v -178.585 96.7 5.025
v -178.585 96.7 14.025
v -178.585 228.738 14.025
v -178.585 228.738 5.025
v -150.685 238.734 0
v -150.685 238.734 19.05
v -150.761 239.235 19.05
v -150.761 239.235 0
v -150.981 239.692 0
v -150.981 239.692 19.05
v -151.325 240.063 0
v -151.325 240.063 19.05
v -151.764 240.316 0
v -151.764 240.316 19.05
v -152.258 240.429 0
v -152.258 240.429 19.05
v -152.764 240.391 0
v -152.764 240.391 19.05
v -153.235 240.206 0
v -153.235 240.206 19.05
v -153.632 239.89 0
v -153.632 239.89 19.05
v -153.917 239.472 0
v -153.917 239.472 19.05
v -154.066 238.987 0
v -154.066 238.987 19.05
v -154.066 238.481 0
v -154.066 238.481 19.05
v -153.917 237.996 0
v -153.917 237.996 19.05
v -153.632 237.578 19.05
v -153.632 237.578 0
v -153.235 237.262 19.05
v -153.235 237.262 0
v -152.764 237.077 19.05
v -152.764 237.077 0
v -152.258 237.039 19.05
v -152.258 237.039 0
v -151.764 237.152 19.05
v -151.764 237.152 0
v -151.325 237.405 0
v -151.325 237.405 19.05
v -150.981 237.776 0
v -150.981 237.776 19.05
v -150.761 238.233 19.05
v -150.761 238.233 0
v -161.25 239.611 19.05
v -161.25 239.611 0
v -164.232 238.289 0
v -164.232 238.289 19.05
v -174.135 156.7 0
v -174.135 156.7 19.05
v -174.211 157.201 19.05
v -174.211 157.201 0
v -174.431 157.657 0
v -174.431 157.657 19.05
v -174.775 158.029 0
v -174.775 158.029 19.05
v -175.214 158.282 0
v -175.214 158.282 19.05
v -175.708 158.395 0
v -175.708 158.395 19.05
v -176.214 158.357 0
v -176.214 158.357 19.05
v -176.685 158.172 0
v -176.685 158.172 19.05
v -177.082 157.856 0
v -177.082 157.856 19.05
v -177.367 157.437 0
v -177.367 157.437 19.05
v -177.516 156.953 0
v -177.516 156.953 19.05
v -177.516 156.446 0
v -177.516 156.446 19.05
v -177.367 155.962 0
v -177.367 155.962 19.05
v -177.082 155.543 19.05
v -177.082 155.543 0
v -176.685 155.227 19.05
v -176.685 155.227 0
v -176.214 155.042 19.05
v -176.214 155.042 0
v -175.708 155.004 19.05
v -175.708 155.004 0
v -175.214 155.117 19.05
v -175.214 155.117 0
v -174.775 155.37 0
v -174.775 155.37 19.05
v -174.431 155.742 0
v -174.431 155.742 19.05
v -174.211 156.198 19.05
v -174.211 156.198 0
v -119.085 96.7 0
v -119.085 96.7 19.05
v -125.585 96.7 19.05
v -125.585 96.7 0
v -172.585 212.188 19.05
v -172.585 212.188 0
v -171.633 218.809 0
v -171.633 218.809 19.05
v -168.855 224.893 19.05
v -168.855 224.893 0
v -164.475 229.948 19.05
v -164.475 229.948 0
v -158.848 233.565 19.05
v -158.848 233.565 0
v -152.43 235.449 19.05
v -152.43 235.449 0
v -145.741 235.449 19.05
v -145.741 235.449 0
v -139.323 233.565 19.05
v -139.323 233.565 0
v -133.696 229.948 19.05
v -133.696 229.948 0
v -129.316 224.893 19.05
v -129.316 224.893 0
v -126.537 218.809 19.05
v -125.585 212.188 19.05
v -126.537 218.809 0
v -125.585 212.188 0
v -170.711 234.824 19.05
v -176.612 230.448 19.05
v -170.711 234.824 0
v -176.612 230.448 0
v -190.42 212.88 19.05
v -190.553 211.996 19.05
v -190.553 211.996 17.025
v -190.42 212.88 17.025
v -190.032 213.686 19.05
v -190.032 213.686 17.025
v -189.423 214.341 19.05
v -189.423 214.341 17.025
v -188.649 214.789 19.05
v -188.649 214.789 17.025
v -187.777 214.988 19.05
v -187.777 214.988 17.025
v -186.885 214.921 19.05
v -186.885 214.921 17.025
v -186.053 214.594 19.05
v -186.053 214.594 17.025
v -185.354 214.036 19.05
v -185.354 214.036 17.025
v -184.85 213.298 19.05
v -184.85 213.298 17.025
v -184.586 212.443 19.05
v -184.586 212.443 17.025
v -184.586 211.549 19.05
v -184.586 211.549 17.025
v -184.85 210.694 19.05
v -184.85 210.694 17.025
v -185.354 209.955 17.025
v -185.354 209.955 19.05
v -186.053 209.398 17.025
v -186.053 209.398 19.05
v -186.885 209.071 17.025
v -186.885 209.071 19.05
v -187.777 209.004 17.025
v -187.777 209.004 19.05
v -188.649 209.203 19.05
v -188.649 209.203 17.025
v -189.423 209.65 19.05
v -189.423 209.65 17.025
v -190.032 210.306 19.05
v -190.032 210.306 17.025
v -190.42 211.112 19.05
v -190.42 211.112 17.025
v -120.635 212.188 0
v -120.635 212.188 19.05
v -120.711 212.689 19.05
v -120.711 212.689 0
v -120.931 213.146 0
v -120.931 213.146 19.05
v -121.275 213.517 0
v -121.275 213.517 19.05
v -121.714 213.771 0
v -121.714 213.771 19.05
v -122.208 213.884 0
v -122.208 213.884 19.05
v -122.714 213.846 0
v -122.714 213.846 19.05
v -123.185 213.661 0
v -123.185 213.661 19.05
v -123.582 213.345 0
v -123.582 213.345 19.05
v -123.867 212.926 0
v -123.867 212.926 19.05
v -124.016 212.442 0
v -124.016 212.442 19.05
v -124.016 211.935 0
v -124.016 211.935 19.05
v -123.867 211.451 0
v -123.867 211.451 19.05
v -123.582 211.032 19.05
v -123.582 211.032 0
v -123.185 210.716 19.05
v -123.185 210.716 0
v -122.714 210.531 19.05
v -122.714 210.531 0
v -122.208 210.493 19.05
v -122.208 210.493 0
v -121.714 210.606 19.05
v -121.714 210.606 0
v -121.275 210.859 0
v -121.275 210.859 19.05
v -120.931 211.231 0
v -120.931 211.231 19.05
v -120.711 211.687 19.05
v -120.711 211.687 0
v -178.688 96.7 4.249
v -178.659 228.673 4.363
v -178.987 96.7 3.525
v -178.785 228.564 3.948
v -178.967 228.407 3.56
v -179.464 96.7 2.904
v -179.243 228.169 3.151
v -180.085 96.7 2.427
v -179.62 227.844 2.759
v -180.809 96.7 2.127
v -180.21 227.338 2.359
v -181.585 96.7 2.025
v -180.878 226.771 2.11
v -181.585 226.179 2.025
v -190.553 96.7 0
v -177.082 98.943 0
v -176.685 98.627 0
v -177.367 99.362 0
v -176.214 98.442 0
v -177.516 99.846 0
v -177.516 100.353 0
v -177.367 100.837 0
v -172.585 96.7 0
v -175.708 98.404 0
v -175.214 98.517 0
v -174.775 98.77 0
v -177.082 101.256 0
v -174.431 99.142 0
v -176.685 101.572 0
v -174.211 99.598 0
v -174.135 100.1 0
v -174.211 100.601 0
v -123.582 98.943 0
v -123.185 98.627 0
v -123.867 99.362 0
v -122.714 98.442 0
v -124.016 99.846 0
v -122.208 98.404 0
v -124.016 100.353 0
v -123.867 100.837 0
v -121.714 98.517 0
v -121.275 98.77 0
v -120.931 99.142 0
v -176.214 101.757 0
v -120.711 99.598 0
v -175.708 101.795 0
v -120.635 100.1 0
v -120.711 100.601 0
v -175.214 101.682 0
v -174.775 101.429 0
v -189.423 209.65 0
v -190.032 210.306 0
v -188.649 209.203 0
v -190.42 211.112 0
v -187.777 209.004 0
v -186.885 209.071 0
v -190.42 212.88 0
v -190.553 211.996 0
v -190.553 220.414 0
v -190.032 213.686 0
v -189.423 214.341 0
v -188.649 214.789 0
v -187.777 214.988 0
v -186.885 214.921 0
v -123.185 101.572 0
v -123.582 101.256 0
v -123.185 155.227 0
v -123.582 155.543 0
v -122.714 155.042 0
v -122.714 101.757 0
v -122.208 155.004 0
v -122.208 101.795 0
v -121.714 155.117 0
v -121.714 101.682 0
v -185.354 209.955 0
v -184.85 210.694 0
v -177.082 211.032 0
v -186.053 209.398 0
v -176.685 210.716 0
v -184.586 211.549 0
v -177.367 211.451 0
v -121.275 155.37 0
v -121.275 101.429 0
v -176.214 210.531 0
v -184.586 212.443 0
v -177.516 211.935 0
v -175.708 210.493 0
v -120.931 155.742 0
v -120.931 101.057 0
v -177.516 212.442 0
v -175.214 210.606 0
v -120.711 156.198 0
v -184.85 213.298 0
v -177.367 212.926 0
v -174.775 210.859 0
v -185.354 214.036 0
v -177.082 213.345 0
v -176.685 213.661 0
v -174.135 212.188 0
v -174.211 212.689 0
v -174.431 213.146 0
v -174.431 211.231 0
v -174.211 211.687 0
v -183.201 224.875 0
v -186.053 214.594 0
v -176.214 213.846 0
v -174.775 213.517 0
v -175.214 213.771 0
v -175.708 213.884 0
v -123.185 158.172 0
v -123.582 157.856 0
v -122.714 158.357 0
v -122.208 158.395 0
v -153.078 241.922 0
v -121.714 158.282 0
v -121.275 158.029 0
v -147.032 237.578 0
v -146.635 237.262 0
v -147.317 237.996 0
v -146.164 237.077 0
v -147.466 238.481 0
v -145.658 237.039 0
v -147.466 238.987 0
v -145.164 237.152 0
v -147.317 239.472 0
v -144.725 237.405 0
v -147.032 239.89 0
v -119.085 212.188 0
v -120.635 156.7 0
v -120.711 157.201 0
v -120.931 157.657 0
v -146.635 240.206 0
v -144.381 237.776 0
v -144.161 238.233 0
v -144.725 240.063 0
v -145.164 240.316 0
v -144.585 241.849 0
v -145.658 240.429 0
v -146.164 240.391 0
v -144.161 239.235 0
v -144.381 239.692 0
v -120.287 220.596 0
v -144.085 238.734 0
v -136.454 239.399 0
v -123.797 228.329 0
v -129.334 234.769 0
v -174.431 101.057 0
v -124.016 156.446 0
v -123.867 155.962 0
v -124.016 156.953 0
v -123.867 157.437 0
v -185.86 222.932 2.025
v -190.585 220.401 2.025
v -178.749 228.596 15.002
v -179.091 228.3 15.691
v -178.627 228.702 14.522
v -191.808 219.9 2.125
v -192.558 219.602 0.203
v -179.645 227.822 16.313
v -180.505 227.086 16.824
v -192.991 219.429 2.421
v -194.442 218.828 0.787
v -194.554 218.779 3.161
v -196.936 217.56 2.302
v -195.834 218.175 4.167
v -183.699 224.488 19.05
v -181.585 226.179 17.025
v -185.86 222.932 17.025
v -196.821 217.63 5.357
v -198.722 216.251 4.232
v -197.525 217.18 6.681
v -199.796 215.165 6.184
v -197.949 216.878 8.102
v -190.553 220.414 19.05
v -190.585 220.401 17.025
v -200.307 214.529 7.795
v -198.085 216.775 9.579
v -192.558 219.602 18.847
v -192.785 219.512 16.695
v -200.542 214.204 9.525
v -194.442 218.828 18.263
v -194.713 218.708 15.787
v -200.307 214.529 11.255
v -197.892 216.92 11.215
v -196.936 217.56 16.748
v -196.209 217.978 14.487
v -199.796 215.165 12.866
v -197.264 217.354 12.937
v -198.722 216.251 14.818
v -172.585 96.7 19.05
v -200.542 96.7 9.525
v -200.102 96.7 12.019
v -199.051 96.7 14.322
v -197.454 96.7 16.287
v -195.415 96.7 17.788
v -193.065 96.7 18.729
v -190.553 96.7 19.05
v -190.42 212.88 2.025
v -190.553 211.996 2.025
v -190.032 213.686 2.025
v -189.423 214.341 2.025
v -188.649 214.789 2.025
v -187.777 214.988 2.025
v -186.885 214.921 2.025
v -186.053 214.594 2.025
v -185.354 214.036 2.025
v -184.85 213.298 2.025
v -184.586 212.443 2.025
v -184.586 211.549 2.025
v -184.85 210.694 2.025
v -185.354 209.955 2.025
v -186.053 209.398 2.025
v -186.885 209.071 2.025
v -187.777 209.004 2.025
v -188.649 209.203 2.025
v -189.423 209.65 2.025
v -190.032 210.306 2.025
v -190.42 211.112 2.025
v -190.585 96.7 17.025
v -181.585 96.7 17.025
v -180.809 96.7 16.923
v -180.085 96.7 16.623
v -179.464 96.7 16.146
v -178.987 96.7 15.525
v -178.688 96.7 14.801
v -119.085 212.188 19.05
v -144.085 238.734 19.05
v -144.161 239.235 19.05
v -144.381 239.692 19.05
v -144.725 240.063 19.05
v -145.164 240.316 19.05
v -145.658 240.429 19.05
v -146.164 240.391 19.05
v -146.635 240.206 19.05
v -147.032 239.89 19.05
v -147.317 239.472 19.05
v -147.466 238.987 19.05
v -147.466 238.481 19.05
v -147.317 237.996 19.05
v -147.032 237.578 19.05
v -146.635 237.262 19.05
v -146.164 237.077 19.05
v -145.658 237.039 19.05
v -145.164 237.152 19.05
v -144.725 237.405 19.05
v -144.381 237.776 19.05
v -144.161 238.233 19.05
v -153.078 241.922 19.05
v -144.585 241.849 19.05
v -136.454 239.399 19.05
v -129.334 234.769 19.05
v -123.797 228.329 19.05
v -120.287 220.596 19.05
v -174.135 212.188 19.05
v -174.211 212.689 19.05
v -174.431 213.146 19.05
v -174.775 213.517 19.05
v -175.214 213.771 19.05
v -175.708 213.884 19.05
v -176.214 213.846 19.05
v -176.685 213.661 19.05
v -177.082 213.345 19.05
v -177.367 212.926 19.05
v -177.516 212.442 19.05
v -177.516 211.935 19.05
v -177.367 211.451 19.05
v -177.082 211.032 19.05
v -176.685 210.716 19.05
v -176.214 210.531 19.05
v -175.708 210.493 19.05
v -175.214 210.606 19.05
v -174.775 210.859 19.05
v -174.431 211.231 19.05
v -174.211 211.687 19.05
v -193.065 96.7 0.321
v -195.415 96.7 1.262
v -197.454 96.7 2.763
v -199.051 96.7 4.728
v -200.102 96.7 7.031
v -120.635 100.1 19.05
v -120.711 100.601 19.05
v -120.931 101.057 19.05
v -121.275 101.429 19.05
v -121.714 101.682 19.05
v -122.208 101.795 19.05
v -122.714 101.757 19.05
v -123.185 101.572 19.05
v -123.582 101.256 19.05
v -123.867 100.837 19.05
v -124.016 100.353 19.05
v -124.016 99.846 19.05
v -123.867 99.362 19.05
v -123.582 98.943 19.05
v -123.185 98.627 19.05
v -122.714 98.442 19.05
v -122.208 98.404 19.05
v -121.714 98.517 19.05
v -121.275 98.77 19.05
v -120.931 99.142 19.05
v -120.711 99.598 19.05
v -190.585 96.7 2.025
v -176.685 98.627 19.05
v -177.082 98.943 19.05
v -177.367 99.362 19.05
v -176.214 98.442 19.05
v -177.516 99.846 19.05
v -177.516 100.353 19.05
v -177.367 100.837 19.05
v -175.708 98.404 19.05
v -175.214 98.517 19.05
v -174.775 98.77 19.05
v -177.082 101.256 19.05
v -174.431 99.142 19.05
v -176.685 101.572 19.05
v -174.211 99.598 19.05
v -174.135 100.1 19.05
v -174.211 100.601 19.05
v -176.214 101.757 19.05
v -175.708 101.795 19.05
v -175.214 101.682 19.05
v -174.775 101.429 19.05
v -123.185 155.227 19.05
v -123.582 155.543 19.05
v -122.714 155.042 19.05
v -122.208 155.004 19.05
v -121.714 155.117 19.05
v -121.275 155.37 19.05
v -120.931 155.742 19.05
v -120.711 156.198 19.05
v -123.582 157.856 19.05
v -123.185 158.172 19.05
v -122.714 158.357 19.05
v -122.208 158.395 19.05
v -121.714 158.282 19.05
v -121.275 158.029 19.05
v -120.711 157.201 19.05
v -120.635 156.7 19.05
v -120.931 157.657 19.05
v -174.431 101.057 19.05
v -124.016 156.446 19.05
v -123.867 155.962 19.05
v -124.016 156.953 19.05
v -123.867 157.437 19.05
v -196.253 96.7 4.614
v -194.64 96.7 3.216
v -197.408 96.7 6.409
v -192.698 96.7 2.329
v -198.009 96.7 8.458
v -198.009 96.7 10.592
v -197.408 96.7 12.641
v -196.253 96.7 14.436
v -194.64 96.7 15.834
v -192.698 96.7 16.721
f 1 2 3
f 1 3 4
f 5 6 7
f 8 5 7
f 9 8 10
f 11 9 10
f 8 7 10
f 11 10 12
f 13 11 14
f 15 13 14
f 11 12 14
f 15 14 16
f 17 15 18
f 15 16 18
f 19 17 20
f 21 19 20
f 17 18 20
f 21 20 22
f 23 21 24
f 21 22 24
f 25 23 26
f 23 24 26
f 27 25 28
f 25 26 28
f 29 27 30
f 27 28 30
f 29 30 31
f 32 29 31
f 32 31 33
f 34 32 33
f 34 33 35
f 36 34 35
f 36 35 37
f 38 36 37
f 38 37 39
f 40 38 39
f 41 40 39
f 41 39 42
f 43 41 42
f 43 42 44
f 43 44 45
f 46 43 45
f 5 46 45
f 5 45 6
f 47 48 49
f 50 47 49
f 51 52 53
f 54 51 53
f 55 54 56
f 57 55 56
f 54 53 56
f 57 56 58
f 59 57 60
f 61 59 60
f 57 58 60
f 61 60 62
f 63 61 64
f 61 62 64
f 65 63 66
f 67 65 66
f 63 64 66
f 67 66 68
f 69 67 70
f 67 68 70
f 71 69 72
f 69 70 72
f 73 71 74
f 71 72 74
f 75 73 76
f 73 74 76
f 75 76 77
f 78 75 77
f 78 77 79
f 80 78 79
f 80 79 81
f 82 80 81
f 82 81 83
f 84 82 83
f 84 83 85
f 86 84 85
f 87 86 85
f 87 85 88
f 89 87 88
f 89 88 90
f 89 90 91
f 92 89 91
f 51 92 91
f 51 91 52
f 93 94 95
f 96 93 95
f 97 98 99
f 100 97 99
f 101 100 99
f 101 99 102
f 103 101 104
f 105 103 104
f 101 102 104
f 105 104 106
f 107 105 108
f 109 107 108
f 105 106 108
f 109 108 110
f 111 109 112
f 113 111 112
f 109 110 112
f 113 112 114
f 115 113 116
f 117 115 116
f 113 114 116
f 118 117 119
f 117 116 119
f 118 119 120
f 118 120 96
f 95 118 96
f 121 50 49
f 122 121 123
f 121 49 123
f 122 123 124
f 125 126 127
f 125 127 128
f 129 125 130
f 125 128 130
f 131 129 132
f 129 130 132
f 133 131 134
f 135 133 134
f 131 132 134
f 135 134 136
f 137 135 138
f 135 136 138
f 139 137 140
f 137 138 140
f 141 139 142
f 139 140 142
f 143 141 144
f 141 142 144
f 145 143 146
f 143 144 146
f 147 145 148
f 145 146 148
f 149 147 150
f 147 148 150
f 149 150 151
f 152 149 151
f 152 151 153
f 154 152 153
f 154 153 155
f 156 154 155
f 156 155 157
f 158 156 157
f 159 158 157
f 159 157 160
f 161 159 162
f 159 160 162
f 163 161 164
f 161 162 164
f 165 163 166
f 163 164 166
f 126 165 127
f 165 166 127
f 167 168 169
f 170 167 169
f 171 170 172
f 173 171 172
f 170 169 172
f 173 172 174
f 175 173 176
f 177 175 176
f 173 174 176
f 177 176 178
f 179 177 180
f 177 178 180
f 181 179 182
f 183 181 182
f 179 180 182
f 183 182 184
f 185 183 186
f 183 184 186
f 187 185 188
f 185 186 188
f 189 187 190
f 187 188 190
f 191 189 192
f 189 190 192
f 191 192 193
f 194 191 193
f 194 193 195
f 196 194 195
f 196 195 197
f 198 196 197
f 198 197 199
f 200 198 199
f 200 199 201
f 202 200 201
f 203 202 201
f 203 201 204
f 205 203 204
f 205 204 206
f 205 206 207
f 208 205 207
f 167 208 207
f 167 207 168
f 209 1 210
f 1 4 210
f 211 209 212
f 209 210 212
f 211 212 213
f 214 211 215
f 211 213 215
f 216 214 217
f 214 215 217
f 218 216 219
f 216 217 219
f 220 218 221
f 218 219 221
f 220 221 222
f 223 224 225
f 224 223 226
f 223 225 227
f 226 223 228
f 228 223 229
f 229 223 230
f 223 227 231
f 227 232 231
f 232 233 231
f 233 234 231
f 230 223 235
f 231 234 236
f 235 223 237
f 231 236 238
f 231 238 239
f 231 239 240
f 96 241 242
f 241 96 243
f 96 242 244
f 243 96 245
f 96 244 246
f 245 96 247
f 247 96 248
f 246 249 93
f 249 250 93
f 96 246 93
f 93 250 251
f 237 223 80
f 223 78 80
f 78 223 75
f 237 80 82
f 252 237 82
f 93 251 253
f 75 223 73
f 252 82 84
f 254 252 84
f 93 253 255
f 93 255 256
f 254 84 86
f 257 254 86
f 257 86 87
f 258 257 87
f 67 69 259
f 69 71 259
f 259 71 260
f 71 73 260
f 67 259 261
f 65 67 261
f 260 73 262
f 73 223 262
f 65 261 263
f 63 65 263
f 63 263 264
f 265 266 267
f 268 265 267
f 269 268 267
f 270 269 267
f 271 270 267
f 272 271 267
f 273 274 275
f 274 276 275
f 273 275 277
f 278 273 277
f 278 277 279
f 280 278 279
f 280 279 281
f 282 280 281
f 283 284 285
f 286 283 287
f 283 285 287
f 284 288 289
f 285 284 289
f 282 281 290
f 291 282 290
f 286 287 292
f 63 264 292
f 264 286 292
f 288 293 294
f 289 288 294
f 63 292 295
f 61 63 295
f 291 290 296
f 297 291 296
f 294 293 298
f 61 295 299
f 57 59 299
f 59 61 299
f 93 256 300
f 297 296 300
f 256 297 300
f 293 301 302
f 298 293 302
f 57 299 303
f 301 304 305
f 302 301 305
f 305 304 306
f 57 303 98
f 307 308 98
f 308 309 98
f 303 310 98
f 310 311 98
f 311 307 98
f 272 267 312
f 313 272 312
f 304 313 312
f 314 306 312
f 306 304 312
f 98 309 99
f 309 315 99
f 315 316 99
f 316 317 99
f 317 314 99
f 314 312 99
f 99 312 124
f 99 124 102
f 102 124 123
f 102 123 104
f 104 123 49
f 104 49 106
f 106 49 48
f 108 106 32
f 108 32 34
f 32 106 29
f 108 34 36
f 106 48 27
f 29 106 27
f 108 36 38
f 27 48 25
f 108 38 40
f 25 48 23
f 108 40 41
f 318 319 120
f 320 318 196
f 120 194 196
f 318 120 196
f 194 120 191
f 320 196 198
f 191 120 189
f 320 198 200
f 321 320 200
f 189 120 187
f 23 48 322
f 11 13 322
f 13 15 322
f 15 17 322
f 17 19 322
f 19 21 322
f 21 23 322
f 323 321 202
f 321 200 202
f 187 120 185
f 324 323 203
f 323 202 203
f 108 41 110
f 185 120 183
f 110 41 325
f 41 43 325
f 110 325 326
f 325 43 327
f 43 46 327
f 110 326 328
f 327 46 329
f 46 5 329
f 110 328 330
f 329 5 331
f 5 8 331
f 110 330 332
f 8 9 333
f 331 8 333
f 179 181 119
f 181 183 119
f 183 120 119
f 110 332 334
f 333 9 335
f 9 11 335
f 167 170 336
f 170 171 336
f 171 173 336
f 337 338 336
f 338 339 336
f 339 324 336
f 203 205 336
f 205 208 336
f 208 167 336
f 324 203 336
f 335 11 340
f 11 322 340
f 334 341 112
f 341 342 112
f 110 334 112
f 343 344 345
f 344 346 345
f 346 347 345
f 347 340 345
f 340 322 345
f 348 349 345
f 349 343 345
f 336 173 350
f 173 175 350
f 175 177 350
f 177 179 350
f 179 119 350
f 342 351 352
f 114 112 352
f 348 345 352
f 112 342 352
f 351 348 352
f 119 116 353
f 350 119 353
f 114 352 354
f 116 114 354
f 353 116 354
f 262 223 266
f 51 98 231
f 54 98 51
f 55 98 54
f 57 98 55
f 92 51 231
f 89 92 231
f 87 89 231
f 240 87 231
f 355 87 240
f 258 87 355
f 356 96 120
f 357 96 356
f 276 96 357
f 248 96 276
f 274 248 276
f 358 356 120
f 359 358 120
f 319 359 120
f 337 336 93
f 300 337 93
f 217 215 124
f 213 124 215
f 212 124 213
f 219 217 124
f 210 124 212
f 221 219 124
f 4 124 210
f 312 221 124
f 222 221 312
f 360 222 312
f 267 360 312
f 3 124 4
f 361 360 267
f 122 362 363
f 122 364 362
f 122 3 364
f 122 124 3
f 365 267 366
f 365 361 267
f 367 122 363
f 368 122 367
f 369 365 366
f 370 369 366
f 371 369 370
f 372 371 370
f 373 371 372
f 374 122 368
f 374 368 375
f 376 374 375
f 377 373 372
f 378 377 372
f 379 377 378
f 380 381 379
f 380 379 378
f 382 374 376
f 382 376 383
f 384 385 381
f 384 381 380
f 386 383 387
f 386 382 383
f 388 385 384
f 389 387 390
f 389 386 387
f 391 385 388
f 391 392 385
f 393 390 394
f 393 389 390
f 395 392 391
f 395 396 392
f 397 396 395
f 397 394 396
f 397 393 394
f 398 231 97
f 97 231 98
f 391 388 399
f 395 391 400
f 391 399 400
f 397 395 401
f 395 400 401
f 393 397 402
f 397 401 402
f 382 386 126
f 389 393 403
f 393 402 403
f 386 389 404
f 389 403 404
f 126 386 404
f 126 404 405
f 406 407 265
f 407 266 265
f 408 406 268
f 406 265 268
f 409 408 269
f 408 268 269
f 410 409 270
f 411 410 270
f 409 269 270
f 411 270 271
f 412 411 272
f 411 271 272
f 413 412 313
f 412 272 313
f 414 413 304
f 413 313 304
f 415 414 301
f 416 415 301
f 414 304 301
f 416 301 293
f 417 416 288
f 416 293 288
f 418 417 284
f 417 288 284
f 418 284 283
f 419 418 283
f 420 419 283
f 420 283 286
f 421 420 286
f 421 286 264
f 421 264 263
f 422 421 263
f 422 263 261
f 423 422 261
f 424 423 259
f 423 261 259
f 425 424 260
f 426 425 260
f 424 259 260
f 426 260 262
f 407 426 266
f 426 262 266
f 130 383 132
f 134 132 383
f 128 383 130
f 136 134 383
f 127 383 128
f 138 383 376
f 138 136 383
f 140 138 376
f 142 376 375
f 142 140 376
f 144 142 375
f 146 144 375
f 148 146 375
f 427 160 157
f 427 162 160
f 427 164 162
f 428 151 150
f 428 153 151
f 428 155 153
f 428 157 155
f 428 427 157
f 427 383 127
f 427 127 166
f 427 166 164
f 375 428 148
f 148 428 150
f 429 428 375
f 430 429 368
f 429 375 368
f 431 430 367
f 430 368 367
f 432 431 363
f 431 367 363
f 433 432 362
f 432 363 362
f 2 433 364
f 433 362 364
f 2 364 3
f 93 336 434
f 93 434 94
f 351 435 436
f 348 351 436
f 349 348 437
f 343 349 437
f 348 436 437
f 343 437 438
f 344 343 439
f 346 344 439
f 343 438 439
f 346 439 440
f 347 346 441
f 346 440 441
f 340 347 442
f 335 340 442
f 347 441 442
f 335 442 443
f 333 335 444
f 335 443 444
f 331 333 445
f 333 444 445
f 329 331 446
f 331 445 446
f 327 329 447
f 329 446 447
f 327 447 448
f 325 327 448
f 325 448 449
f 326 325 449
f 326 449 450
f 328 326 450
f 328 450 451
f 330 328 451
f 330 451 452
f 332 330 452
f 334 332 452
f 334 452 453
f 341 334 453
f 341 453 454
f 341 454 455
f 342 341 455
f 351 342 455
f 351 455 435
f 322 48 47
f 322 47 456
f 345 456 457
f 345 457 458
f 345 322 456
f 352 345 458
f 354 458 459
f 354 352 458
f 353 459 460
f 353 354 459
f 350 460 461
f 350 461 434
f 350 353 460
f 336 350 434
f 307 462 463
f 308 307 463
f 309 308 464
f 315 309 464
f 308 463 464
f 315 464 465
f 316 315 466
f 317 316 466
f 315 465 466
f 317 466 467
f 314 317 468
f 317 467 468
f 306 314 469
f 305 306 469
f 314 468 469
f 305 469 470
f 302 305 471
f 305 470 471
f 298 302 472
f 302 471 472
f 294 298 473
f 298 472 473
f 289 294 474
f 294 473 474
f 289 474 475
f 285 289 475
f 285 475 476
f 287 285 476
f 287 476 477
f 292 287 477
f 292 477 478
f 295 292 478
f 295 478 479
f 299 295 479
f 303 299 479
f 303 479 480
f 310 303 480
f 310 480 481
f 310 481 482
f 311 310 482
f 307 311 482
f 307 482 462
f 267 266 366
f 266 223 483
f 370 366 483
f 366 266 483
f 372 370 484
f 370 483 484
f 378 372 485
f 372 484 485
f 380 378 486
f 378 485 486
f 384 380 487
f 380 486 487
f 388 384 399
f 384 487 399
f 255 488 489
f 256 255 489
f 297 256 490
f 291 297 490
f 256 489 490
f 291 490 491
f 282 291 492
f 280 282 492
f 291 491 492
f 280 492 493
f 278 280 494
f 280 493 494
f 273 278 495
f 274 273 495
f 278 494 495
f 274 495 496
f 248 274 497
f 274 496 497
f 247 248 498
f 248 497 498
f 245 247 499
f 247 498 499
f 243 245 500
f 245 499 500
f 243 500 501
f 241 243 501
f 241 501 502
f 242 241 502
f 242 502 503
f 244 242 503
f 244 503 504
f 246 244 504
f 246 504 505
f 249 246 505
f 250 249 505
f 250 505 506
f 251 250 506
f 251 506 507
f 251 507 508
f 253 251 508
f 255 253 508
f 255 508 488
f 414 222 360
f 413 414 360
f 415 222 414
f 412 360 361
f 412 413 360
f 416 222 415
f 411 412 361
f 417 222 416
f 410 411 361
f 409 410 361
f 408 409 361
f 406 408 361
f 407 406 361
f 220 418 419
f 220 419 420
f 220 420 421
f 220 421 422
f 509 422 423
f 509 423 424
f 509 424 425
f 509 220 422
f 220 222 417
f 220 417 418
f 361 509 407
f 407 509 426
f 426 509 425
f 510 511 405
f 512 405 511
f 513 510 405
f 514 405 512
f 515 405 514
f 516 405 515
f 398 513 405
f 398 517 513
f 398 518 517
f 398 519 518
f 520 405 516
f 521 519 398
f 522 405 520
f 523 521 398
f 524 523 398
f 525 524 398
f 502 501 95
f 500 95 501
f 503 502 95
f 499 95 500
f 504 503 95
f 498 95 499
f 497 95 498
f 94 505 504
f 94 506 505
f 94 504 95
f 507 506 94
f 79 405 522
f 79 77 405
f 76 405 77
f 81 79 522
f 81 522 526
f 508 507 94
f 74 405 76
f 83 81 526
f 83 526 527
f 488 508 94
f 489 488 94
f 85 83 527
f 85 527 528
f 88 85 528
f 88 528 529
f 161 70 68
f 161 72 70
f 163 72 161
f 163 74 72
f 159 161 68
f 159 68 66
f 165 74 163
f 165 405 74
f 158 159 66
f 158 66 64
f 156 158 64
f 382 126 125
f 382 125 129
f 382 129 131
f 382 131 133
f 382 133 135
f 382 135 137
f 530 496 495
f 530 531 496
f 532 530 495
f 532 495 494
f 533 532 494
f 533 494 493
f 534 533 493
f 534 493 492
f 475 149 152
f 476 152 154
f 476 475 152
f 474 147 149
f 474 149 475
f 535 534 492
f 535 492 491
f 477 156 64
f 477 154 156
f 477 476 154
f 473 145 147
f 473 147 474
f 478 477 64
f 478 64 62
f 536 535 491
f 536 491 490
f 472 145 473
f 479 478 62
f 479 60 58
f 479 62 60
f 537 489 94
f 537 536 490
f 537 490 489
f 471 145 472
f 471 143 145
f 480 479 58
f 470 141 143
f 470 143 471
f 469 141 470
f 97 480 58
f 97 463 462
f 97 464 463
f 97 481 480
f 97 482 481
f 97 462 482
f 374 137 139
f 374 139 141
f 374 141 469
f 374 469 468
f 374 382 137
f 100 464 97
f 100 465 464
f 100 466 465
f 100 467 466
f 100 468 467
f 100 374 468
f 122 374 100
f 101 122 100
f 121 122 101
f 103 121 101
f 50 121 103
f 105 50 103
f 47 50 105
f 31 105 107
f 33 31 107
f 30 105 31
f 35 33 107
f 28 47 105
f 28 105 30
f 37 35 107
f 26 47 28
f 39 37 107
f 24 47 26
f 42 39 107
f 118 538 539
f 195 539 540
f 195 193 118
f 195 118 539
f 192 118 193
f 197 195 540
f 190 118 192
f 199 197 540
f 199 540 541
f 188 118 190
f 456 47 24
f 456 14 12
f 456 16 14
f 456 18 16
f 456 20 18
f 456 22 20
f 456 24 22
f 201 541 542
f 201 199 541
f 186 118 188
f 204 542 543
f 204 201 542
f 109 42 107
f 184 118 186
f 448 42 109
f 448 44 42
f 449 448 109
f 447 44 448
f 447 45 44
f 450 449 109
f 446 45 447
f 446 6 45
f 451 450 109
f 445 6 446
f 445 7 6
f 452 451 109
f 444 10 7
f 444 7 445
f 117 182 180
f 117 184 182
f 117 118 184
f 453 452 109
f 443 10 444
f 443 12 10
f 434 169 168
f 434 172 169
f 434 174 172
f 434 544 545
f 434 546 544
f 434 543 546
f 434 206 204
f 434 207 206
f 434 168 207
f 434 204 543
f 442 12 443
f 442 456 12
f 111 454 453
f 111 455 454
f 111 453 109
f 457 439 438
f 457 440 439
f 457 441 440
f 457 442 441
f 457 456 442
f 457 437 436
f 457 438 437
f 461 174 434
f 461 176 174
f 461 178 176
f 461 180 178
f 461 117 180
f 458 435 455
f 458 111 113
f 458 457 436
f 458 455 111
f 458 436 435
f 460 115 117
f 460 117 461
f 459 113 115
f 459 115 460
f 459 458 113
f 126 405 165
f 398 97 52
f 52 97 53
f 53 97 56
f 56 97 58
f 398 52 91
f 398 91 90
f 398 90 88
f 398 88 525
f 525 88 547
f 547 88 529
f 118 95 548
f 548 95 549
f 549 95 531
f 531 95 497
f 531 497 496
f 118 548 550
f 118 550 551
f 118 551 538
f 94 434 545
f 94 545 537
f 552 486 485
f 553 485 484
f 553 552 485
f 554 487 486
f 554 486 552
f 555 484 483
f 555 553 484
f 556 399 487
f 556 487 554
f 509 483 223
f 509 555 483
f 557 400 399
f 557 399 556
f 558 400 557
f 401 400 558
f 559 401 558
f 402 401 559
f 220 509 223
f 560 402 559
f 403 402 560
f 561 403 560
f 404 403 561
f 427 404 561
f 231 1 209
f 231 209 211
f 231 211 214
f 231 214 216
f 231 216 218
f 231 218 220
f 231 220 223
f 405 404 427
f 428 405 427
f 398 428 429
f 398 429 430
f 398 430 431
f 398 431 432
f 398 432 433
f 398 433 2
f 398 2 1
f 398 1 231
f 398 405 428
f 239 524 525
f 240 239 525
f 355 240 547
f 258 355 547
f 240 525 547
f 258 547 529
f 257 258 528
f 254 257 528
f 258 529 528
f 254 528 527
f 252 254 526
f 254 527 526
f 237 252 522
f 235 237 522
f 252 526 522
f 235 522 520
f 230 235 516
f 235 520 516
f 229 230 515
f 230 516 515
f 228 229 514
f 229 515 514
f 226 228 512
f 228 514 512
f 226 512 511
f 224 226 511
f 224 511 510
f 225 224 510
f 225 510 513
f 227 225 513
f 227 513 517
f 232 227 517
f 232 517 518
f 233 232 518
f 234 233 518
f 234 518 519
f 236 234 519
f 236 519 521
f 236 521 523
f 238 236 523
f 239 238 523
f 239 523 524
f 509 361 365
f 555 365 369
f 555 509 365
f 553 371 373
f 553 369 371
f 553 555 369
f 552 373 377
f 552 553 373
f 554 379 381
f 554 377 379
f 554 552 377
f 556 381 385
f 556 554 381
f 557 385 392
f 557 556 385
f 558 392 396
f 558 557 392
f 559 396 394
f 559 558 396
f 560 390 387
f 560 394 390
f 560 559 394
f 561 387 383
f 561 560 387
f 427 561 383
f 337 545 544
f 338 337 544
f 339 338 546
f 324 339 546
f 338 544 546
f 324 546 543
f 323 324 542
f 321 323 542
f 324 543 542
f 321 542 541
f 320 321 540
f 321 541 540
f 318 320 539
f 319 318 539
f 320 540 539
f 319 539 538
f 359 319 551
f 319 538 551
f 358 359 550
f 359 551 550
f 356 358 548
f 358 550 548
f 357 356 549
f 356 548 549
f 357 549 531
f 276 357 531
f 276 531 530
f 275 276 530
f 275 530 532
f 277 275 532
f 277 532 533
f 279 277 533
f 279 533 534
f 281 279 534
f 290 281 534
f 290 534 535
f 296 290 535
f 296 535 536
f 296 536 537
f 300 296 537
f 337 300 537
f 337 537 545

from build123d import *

# Parameters (mm, degrees)
BOSS_EXTRUDE1_DEPTH = 19.05
SKETCH2_R           = 1.7
CUT_EXTRUDE1_DEPTH  = 302.810637772
CUT_EXTRUDE2_DEPTH  = 302.810637772
BOSS_EXTRUDE2_DEPTH = 135
BOSS_EXTRUDE3_START = -19.05
BOSS_EXTRUDE3_DEPTH = 19.05
CUT_EXTRUDE4_DEPTH  = 316.043777756
CUT_EXTRUDE5_DEPTH  = 249.524391307
FILLET2_R           = 50
FILLET3_R           = 10
FILLET4_R           = 3
SKETCH8_R           = 3
CUT_EXTRUDE6_DEPTH  = 316.015975709


with BuildPart() as part:
    # Sketch1 → Boss-Extrude1 (new body)
    with BuildSketch(Plane.XY):
        with BuildLine():
            Line((-179.085368151, -18.789194183), (-179.085368151, 212.188334746))
            ThreePointArc((-179.085368151, 212.188334746), (-149.085368151, 242.188334746), (-119.085368151, 212.188334746))
            Line((-119.085368151, 212.188334746), (-119.085368151, -18.789194183))
            ThreePointArc((-119.085368151, -18.789194183), (-149.085368151, -48.789194183), (-179.085368151, -18.789194183))
        make_face()
        with BuildLine():
            Line((-172.585368151, -18.789194183), (-172.585368151, 212.188334746))
            ThreePointArc((-172.585368151, 212.188334746), (-149.085368151, 235.688334746), (-125.585368151, 212.188334746))
            Line((-125.585368151, 212.188334746), (-125.585368151, -18.789194183))
            ThreePointArc((-125.585368151, -18.789194183), (-149.085368151, -42.289194183), (-172.585368151, -18.789194183))
        make_face(mode=Mode.SUBTRACT)
    extrude(amount=BOSS_EXTRUDE1_DEPTH)

    # Sketch2 → Cut-Extrude1 (cut, through all)
    with BuildSketch(Plane.XY.offset(19.05)):
        with Locations((-145.785368151, 238.734002942)):
            Circle(SKETCH2_R)
        with Locations((-122.335368151, 212.188334746)):
            Circle(SKETCH2_R)
        with Locations((-152.485368151, -45.322239617)):
            Circle(SKETCH2_R)
        with Locations((-168.000474547, -37.70430058)):
            Circle(SKETCH2_R)
        with Locations((-175.835368151, -18.789194183)):
            Circle(SKETCH2_R)
        with Locations((-175.835368151, 212.188334746)):
            Circle(SKETCH2_R)
        with Locations((-145.685368151, -45.322239617)):
            Circle(SKETCH2_R)
        with Locations((-175.835368151, 100.099570281)):
            Circle(SKETCH2_R)
        with Locations((-175.835368151, 93.299570281)):
            Circle(SKETCH2_R)
        with Locations((-122.335368151, 100.099570281)):
            Circle(SKETCH2_R)
        with Locations((-122.335368151, 93.299570281)):
            Circle(SKETCH2_R)
        with Locations((-122.335368151, -18.789194183)):
            Circle(SKETCH2_R)
        with Locations((-130.170261754, -37.70430058)):
            Circle(SKETCH2_R)
        with Locations((-175.835368151, 156.699570281)):
            Circle(SKETCH2_R)
        with Locations((-122.335368151, 156.699570281)):
            Circle(SKETCH2_R)
        with Locations((-175.835368151, 66.699570281)):
            Circle(SKETCH2_R)
        with Locations((-122.335368151, 66.699570281)):
            Circle(SKETCH2_R)
        with Locations((-175.835368151, 36.699570281)):
            Circle(SKETCH2_R)
        with Locations((-122.335368151, 36.699570281)):
            Circle(SKETCH2_R)
        with Locations((-175.835368151, 6.699570281)):
            Circle(SKETCH2_R)
        with Locations((-122.335368151, 6.699570281)):
            Circle(SKETCH2_R)
        with Locations((-152.385368151, 238.734002942)):
            Circle(SKETCH2_R)
    extrude(amount=-CUT_EXTRUDE1_DEPTH, mode=Mode.SUBTRACT)

    # Sketch3 → Cut-Extrude2 (cut, through all)
    with BuildSketch(Plane.XY.offset(19.05)):
        Polygon((-149.085368151, 96.699570281), (-100.167336626, 96.699570281), (-100.167336626, -59.171887956), (-212.527814826, -59.171887956), (-212.527814826, 96.699570281), align=None)
    extrude(amount=-CUT_EXTRUDE2_DEPTH, mode=Mode.SUBTRACT)

    # Sketch4 → Boss-Extrude2 (add)
    with BuildSketch(Plane.XZ.offset(-96.699570281)):
        with BuildLine():
            Line((-179.085368151, 19.05), (-196.652205402, 19.05))
            ThreePointArc((-196.652205402, 19.05), (-200.585368151, 9.525), (-196.652205402, 0))
            Line((-196.652205402, 0), (-179.085368151, 0))
            Line((-179.085368151, 0), (-179.085368151, 19.05))
        make_face()
    extrude(amount=-BOSS_EXTRUDE2_DEPTH)

    # Sketch5 → Boss-Extrude3 (add)
    with BuildSketch(Plane.XY.offset(19.05).offset(BOSS_EXTRUDE3_START)):
        with BuildLine():
            Line((-179.085368151, 231.699570281), (-179.085368151, 212.188334746))
            ThreePointArc((-179.085368151, 212.188334746), (-174.234371945, 228.544605963), (-161.250194275, 239.611263206))
            Line((-161.250194275, 239.611263206), (-179.085368151, 231.699570281))
        make_face()
    extrude(amount=BOSS_EXTRUDE3_DEPTH)

    # Sketch6 → Cut-Extrude4 (cut, through all)
    with BuildSketch(Plane.XY.offset(19.05)):
        with BuildLine():
            Line((-170.167781213, 235.655416744), (-200.585368151, 235.655416744))
            Line((-200.585368151, 235.655416744), (-200.585368151, 214.140637656))
            add(Edge.make_bspline(
                [(-170.167781213, 235.655416744), (-176.900282948, 230.746544465), (-186.999558372, 219.576390382), (-197.475317375, 218.661877457), (-200.585368151, 214.140637656)],
                knots=[0, 0, 0, 0, 0.548460348, 1, 1, 1, 1], degree=3))
        make_face()
    extrude(amount=-CUT_EXTRUDE4_DEPTH, mode=Mode.SUBTRACT)

    # Sketch7 → Cut-Extrude5 (cut, through all)
    with BuildSketch(Plane.XZ.offset(-96.699570281)):
        with BuildLine():
            Line((-190.585368151, 17.025), (-178.585368151, 17.025))
            Line((-178.585368151, 17.025), (-178.585368151, 2.025))
            Line((-178.585368151, 2.025), (-190.585368151, 2.025))
            ThreePointArc((-190.585368151, 2.025), (-198.085368151, 9.525), (-190.585368151, 17.025))
        make_face()
    extrude(amount=-CUT_EXTRUDE5_DEPTH, mode=Mode.SUBTRACT)

    # Fillet2
    fillet2_edges = [part.edges().sort_by_distance(p)[0] for p in [
        (-170.167781213, 235.655416744, 9.525),
    ]]
    fillet(fillet2_edges, radius=FILLET2_R)

    # Fillet3
    # the kernel refuses this fillet: 10 mm, written as the material it takes off along each edge
    with BuildSketch(Plane(origin=(-196.652205402, 66.752998532, 0), x_dir=(1, 0, 0), z_dir=(0, 1, 0))) as fillet3_piece_1:
        with BuildLine():
            CenterArc((6.099219193, -10), FILLET3_R, 90, 97.799925588)
            ThreePointArc((-3.808260974, -11.357142857), (-3.23274377, -5.233062714), (0, 0))
            Line((0, 0), (6.099219193, 0))
        make_face()
    extrude(amount=180.922793438, mode=Mode.SUBTRACT)
    with BuildSketch(Plane(origin=(-196.652205402, 66.752998532, 19.05), x_dir=(-0.3179212804444137, 0, -0.9481171127242586), z_dir=(0, 1, 0))) as fillet3_piece_2:
        with BuildLine():
            CenterArc((7.542099552, -8.961986896), FILLET3_R, 63.66281519, 97.799925588)
            Line((-1.939071576, -5.782774091), (0, 0))
            ThreePointArc((0, 0), (5.98931435, 1.401317691), (11.9786287, 0))
        make_face()
    extrude(amount=180.922793438, mode=Mode.SUBTRACT)

    # Fillet4
    fillet4_edges = [part.edges().sort_by_distance(p)[0] for p in [
        (-178.585368151, 162.718537025, 17.025),
        (-178.585368151, 162.718537025, 2.025),
    ]]
    fillet(fillet4_edges, radius=FILLET4_R)

    # Sketch8 → Cut-Extrude6 (cut, through all)
    with BuildSketch(Plane(origin=(0, 0, 0), x_dir=(-1, 0, 0), z_dir=(0, 0, -1))):
        with Locations((187.552986209, 211.995977711)):
            Circle(SKETCH8_R)
    extrude(amount=-CUT_EXTRUDE6_DEPTH, mode=Mode.SUBTRACT)


solid = part.part
